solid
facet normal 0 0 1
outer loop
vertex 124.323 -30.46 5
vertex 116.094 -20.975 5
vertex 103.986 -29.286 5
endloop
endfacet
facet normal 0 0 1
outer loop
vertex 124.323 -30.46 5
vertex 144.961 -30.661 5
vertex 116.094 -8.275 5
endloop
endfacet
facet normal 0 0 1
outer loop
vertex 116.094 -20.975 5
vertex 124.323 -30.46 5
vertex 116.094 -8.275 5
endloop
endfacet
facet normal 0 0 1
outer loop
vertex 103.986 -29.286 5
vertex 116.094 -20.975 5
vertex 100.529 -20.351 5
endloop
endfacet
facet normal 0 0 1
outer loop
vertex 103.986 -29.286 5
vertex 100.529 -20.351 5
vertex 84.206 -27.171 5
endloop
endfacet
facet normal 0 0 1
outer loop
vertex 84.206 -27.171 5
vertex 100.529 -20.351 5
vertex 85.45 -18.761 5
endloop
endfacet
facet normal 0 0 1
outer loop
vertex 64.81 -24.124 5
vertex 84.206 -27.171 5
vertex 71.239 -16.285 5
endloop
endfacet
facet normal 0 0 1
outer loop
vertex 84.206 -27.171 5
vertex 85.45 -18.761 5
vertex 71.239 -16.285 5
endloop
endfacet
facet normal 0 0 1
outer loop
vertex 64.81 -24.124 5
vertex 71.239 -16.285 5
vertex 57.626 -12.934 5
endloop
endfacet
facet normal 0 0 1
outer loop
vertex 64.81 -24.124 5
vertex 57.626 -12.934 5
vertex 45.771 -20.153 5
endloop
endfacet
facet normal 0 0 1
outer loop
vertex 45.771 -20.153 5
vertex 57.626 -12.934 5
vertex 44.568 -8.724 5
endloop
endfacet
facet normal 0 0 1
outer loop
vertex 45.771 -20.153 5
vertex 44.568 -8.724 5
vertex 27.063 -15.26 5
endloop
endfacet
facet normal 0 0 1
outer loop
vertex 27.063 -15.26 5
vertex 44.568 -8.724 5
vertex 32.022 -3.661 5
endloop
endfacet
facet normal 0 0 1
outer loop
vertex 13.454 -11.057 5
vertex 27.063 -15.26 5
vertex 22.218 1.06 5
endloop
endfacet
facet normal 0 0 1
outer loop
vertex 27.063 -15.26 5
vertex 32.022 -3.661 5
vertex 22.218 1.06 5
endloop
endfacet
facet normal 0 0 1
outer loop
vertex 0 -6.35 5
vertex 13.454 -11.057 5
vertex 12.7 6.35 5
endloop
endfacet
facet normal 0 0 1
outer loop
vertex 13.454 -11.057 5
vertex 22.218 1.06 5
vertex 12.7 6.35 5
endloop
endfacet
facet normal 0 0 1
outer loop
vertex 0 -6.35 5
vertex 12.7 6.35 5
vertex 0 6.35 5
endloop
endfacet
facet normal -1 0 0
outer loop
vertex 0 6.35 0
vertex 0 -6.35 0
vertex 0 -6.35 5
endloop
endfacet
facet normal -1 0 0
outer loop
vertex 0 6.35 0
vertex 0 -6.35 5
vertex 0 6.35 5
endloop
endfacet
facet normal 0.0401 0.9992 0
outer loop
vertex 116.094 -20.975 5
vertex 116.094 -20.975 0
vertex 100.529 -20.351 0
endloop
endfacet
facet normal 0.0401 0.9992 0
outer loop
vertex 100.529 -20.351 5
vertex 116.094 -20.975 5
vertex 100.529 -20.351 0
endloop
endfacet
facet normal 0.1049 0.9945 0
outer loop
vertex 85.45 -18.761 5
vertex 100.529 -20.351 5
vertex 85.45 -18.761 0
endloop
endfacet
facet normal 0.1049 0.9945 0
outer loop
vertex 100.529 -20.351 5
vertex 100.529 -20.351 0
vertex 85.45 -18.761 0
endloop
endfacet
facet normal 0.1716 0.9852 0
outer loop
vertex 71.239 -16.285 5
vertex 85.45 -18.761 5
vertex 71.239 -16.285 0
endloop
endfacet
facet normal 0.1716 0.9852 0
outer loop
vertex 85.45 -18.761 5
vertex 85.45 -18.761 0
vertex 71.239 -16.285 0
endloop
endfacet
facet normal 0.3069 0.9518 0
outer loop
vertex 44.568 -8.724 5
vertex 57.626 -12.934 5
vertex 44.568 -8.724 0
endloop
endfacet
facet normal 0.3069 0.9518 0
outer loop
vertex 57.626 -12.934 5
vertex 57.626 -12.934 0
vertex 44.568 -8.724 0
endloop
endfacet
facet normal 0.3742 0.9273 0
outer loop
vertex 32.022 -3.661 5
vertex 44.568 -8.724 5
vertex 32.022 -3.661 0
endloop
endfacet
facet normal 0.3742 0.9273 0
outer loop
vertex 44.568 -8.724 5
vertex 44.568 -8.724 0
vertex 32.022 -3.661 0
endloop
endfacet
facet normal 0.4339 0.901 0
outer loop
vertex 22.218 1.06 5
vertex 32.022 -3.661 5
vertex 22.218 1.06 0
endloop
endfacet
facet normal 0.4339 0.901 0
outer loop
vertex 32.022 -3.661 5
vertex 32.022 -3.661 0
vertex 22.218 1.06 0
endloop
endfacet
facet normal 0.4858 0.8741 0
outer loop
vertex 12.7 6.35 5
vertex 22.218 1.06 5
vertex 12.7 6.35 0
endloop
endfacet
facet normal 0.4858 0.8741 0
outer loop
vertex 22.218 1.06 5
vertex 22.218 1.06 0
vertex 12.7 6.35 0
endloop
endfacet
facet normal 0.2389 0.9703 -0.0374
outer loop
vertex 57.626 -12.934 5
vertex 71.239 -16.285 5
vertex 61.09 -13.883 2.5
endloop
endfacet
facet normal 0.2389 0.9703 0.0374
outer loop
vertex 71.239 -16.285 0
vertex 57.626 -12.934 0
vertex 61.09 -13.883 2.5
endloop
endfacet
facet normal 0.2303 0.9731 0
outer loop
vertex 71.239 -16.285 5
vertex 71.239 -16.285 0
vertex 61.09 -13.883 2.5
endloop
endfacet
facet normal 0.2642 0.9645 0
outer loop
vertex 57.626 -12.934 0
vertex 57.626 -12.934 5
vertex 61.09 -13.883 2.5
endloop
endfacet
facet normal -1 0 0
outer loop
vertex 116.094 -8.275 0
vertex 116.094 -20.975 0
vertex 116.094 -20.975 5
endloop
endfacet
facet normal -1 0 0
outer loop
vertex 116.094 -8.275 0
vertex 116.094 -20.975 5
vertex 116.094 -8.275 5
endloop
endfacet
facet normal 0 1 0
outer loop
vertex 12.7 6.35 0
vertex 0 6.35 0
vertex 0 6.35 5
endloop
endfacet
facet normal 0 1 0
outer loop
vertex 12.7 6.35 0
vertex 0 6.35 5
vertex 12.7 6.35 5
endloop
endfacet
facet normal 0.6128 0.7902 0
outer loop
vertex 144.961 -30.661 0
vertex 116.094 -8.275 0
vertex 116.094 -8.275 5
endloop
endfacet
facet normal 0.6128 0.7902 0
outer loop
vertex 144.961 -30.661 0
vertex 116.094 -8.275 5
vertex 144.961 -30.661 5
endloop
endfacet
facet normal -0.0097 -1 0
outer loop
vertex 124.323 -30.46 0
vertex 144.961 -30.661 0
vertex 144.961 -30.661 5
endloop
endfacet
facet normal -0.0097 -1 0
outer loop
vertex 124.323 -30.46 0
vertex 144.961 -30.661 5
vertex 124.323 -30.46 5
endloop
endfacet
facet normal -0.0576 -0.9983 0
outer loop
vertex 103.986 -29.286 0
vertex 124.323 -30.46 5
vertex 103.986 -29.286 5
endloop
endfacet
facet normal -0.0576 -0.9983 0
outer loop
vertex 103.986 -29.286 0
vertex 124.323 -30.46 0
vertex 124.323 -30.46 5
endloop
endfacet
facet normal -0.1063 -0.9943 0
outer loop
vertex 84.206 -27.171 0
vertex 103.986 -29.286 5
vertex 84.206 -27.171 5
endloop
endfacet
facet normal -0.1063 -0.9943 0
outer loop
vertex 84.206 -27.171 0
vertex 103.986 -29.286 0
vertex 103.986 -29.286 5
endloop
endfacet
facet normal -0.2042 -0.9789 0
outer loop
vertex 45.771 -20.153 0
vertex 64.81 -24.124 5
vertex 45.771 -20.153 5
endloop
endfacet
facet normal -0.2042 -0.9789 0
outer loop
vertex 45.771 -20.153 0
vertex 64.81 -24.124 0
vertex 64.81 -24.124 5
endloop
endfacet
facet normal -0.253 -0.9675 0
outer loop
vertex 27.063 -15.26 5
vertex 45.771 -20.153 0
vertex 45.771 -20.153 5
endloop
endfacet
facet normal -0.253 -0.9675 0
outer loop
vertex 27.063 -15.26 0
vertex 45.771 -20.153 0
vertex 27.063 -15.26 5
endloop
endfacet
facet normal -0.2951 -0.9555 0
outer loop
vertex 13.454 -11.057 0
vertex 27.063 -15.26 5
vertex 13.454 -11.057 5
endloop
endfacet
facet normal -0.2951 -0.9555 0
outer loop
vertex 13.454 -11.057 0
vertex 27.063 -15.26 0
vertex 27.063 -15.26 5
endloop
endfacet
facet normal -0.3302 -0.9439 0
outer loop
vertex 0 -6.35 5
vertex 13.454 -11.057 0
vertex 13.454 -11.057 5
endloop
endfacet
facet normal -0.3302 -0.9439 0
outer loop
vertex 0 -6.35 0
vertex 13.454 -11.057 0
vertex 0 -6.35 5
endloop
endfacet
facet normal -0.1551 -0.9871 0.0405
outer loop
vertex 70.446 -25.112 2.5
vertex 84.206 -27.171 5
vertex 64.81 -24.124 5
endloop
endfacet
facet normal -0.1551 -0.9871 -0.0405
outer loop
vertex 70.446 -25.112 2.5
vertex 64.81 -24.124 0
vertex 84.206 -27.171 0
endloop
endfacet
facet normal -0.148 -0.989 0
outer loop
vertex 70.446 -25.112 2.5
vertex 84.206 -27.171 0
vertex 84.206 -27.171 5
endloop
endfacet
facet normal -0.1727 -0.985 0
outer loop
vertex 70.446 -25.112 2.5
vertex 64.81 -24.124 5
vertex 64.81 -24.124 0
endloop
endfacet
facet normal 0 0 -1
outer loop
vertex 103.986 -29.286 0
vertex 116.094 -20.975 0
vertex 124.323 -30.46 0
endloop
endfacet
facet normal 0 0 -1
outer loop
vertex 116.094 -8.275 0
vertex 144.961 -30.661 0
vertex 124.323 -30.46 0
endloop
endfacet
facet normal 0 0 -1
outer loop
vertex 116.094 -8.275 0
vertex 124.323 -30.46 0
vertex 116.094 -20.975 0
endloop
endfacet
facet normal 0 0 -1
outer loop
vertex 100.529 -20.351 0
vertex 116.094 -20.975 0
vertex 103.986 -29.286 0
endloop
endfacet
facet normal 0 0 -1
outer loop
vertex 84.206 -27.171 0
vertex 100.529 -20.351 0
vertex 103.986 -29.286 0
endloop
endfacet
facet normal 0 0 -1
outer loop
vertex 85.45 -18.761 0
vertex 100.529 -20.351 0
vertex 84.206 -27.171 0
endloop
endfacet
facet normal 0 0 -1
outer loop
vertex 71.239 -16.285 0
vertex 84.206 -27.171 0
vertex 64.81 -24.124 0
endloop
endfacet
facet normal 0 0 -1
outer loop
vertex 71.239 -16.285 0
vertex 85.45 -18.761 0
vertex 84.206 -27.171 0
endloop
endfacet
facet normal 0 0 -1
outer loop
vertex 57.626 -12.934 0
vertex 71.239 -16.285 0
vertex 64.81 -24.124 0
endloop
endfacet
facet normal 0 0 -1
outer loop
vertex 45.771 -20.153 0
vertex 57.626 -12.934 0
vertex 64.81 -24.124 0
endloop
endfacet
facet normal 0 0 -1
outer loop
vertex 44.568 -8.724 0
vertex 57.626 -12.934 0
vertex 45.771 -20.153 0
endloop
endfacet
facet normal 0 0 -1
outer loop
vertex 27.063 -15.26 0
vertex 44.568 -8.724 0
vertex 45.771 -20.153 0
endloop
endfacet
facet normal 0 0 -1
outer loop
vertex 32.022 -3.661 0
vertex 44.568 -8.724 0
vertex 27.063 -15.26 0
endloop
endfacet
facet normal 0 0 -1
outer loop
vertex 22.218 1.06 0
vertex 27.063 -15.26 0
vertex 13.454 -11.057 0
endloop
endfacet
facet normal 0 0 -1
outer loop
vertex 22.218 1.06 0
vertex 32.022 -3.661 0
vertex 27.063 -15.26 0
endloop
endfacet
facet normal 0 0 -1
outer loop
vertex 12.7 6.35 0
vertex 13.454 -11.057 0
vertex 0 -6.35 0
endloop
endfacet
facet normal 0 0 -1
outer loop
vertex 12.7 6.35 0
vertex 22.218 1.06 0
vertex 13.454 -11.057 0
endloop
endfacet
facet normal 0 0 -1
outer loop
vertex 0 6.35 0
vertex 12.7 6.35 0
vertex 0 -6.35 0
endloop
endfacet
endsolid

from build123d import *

# Parameters (mm, degrees)
BOSS_EXTRUDE1_DEPTH = 5


with BuildPart() as part:
    # Sketch1 → Boss-Extrude1 (new body)
    with BuildSketch(Plane.XY):
        with BuildLine():
            Line((0, -6.35), (0, 6.35))
            Line((0, 6.35), (12.7, 6.35))
            add(Edge.make_bspline(
                [(116.09390226, -20.974913526), (57.782450288, -20.453591086), (12.7, 6.35)],
                knots=[0, 0, 0, 0.666344137, 0.666344137, 0.666344137], degree=2))
            Line((116.09390226, -20.974913526), (116.09390226, -8.274913526))
            Line((116.09390226, -8.274913526), (144.960512242, -30.660512242))
            add(Edge.make_bspline(
                [(144.960512242, -30.660512242), (68.411482742, -31.717840837), (0, -6.35)],
                knots=[0, 0, 0, 0.71155061, 0.71155061, 0.71155061], degree=2))
        make_face()
    extrude(amount=BOSS_EXTRUDE1_DEPTH)


solid = part.part
